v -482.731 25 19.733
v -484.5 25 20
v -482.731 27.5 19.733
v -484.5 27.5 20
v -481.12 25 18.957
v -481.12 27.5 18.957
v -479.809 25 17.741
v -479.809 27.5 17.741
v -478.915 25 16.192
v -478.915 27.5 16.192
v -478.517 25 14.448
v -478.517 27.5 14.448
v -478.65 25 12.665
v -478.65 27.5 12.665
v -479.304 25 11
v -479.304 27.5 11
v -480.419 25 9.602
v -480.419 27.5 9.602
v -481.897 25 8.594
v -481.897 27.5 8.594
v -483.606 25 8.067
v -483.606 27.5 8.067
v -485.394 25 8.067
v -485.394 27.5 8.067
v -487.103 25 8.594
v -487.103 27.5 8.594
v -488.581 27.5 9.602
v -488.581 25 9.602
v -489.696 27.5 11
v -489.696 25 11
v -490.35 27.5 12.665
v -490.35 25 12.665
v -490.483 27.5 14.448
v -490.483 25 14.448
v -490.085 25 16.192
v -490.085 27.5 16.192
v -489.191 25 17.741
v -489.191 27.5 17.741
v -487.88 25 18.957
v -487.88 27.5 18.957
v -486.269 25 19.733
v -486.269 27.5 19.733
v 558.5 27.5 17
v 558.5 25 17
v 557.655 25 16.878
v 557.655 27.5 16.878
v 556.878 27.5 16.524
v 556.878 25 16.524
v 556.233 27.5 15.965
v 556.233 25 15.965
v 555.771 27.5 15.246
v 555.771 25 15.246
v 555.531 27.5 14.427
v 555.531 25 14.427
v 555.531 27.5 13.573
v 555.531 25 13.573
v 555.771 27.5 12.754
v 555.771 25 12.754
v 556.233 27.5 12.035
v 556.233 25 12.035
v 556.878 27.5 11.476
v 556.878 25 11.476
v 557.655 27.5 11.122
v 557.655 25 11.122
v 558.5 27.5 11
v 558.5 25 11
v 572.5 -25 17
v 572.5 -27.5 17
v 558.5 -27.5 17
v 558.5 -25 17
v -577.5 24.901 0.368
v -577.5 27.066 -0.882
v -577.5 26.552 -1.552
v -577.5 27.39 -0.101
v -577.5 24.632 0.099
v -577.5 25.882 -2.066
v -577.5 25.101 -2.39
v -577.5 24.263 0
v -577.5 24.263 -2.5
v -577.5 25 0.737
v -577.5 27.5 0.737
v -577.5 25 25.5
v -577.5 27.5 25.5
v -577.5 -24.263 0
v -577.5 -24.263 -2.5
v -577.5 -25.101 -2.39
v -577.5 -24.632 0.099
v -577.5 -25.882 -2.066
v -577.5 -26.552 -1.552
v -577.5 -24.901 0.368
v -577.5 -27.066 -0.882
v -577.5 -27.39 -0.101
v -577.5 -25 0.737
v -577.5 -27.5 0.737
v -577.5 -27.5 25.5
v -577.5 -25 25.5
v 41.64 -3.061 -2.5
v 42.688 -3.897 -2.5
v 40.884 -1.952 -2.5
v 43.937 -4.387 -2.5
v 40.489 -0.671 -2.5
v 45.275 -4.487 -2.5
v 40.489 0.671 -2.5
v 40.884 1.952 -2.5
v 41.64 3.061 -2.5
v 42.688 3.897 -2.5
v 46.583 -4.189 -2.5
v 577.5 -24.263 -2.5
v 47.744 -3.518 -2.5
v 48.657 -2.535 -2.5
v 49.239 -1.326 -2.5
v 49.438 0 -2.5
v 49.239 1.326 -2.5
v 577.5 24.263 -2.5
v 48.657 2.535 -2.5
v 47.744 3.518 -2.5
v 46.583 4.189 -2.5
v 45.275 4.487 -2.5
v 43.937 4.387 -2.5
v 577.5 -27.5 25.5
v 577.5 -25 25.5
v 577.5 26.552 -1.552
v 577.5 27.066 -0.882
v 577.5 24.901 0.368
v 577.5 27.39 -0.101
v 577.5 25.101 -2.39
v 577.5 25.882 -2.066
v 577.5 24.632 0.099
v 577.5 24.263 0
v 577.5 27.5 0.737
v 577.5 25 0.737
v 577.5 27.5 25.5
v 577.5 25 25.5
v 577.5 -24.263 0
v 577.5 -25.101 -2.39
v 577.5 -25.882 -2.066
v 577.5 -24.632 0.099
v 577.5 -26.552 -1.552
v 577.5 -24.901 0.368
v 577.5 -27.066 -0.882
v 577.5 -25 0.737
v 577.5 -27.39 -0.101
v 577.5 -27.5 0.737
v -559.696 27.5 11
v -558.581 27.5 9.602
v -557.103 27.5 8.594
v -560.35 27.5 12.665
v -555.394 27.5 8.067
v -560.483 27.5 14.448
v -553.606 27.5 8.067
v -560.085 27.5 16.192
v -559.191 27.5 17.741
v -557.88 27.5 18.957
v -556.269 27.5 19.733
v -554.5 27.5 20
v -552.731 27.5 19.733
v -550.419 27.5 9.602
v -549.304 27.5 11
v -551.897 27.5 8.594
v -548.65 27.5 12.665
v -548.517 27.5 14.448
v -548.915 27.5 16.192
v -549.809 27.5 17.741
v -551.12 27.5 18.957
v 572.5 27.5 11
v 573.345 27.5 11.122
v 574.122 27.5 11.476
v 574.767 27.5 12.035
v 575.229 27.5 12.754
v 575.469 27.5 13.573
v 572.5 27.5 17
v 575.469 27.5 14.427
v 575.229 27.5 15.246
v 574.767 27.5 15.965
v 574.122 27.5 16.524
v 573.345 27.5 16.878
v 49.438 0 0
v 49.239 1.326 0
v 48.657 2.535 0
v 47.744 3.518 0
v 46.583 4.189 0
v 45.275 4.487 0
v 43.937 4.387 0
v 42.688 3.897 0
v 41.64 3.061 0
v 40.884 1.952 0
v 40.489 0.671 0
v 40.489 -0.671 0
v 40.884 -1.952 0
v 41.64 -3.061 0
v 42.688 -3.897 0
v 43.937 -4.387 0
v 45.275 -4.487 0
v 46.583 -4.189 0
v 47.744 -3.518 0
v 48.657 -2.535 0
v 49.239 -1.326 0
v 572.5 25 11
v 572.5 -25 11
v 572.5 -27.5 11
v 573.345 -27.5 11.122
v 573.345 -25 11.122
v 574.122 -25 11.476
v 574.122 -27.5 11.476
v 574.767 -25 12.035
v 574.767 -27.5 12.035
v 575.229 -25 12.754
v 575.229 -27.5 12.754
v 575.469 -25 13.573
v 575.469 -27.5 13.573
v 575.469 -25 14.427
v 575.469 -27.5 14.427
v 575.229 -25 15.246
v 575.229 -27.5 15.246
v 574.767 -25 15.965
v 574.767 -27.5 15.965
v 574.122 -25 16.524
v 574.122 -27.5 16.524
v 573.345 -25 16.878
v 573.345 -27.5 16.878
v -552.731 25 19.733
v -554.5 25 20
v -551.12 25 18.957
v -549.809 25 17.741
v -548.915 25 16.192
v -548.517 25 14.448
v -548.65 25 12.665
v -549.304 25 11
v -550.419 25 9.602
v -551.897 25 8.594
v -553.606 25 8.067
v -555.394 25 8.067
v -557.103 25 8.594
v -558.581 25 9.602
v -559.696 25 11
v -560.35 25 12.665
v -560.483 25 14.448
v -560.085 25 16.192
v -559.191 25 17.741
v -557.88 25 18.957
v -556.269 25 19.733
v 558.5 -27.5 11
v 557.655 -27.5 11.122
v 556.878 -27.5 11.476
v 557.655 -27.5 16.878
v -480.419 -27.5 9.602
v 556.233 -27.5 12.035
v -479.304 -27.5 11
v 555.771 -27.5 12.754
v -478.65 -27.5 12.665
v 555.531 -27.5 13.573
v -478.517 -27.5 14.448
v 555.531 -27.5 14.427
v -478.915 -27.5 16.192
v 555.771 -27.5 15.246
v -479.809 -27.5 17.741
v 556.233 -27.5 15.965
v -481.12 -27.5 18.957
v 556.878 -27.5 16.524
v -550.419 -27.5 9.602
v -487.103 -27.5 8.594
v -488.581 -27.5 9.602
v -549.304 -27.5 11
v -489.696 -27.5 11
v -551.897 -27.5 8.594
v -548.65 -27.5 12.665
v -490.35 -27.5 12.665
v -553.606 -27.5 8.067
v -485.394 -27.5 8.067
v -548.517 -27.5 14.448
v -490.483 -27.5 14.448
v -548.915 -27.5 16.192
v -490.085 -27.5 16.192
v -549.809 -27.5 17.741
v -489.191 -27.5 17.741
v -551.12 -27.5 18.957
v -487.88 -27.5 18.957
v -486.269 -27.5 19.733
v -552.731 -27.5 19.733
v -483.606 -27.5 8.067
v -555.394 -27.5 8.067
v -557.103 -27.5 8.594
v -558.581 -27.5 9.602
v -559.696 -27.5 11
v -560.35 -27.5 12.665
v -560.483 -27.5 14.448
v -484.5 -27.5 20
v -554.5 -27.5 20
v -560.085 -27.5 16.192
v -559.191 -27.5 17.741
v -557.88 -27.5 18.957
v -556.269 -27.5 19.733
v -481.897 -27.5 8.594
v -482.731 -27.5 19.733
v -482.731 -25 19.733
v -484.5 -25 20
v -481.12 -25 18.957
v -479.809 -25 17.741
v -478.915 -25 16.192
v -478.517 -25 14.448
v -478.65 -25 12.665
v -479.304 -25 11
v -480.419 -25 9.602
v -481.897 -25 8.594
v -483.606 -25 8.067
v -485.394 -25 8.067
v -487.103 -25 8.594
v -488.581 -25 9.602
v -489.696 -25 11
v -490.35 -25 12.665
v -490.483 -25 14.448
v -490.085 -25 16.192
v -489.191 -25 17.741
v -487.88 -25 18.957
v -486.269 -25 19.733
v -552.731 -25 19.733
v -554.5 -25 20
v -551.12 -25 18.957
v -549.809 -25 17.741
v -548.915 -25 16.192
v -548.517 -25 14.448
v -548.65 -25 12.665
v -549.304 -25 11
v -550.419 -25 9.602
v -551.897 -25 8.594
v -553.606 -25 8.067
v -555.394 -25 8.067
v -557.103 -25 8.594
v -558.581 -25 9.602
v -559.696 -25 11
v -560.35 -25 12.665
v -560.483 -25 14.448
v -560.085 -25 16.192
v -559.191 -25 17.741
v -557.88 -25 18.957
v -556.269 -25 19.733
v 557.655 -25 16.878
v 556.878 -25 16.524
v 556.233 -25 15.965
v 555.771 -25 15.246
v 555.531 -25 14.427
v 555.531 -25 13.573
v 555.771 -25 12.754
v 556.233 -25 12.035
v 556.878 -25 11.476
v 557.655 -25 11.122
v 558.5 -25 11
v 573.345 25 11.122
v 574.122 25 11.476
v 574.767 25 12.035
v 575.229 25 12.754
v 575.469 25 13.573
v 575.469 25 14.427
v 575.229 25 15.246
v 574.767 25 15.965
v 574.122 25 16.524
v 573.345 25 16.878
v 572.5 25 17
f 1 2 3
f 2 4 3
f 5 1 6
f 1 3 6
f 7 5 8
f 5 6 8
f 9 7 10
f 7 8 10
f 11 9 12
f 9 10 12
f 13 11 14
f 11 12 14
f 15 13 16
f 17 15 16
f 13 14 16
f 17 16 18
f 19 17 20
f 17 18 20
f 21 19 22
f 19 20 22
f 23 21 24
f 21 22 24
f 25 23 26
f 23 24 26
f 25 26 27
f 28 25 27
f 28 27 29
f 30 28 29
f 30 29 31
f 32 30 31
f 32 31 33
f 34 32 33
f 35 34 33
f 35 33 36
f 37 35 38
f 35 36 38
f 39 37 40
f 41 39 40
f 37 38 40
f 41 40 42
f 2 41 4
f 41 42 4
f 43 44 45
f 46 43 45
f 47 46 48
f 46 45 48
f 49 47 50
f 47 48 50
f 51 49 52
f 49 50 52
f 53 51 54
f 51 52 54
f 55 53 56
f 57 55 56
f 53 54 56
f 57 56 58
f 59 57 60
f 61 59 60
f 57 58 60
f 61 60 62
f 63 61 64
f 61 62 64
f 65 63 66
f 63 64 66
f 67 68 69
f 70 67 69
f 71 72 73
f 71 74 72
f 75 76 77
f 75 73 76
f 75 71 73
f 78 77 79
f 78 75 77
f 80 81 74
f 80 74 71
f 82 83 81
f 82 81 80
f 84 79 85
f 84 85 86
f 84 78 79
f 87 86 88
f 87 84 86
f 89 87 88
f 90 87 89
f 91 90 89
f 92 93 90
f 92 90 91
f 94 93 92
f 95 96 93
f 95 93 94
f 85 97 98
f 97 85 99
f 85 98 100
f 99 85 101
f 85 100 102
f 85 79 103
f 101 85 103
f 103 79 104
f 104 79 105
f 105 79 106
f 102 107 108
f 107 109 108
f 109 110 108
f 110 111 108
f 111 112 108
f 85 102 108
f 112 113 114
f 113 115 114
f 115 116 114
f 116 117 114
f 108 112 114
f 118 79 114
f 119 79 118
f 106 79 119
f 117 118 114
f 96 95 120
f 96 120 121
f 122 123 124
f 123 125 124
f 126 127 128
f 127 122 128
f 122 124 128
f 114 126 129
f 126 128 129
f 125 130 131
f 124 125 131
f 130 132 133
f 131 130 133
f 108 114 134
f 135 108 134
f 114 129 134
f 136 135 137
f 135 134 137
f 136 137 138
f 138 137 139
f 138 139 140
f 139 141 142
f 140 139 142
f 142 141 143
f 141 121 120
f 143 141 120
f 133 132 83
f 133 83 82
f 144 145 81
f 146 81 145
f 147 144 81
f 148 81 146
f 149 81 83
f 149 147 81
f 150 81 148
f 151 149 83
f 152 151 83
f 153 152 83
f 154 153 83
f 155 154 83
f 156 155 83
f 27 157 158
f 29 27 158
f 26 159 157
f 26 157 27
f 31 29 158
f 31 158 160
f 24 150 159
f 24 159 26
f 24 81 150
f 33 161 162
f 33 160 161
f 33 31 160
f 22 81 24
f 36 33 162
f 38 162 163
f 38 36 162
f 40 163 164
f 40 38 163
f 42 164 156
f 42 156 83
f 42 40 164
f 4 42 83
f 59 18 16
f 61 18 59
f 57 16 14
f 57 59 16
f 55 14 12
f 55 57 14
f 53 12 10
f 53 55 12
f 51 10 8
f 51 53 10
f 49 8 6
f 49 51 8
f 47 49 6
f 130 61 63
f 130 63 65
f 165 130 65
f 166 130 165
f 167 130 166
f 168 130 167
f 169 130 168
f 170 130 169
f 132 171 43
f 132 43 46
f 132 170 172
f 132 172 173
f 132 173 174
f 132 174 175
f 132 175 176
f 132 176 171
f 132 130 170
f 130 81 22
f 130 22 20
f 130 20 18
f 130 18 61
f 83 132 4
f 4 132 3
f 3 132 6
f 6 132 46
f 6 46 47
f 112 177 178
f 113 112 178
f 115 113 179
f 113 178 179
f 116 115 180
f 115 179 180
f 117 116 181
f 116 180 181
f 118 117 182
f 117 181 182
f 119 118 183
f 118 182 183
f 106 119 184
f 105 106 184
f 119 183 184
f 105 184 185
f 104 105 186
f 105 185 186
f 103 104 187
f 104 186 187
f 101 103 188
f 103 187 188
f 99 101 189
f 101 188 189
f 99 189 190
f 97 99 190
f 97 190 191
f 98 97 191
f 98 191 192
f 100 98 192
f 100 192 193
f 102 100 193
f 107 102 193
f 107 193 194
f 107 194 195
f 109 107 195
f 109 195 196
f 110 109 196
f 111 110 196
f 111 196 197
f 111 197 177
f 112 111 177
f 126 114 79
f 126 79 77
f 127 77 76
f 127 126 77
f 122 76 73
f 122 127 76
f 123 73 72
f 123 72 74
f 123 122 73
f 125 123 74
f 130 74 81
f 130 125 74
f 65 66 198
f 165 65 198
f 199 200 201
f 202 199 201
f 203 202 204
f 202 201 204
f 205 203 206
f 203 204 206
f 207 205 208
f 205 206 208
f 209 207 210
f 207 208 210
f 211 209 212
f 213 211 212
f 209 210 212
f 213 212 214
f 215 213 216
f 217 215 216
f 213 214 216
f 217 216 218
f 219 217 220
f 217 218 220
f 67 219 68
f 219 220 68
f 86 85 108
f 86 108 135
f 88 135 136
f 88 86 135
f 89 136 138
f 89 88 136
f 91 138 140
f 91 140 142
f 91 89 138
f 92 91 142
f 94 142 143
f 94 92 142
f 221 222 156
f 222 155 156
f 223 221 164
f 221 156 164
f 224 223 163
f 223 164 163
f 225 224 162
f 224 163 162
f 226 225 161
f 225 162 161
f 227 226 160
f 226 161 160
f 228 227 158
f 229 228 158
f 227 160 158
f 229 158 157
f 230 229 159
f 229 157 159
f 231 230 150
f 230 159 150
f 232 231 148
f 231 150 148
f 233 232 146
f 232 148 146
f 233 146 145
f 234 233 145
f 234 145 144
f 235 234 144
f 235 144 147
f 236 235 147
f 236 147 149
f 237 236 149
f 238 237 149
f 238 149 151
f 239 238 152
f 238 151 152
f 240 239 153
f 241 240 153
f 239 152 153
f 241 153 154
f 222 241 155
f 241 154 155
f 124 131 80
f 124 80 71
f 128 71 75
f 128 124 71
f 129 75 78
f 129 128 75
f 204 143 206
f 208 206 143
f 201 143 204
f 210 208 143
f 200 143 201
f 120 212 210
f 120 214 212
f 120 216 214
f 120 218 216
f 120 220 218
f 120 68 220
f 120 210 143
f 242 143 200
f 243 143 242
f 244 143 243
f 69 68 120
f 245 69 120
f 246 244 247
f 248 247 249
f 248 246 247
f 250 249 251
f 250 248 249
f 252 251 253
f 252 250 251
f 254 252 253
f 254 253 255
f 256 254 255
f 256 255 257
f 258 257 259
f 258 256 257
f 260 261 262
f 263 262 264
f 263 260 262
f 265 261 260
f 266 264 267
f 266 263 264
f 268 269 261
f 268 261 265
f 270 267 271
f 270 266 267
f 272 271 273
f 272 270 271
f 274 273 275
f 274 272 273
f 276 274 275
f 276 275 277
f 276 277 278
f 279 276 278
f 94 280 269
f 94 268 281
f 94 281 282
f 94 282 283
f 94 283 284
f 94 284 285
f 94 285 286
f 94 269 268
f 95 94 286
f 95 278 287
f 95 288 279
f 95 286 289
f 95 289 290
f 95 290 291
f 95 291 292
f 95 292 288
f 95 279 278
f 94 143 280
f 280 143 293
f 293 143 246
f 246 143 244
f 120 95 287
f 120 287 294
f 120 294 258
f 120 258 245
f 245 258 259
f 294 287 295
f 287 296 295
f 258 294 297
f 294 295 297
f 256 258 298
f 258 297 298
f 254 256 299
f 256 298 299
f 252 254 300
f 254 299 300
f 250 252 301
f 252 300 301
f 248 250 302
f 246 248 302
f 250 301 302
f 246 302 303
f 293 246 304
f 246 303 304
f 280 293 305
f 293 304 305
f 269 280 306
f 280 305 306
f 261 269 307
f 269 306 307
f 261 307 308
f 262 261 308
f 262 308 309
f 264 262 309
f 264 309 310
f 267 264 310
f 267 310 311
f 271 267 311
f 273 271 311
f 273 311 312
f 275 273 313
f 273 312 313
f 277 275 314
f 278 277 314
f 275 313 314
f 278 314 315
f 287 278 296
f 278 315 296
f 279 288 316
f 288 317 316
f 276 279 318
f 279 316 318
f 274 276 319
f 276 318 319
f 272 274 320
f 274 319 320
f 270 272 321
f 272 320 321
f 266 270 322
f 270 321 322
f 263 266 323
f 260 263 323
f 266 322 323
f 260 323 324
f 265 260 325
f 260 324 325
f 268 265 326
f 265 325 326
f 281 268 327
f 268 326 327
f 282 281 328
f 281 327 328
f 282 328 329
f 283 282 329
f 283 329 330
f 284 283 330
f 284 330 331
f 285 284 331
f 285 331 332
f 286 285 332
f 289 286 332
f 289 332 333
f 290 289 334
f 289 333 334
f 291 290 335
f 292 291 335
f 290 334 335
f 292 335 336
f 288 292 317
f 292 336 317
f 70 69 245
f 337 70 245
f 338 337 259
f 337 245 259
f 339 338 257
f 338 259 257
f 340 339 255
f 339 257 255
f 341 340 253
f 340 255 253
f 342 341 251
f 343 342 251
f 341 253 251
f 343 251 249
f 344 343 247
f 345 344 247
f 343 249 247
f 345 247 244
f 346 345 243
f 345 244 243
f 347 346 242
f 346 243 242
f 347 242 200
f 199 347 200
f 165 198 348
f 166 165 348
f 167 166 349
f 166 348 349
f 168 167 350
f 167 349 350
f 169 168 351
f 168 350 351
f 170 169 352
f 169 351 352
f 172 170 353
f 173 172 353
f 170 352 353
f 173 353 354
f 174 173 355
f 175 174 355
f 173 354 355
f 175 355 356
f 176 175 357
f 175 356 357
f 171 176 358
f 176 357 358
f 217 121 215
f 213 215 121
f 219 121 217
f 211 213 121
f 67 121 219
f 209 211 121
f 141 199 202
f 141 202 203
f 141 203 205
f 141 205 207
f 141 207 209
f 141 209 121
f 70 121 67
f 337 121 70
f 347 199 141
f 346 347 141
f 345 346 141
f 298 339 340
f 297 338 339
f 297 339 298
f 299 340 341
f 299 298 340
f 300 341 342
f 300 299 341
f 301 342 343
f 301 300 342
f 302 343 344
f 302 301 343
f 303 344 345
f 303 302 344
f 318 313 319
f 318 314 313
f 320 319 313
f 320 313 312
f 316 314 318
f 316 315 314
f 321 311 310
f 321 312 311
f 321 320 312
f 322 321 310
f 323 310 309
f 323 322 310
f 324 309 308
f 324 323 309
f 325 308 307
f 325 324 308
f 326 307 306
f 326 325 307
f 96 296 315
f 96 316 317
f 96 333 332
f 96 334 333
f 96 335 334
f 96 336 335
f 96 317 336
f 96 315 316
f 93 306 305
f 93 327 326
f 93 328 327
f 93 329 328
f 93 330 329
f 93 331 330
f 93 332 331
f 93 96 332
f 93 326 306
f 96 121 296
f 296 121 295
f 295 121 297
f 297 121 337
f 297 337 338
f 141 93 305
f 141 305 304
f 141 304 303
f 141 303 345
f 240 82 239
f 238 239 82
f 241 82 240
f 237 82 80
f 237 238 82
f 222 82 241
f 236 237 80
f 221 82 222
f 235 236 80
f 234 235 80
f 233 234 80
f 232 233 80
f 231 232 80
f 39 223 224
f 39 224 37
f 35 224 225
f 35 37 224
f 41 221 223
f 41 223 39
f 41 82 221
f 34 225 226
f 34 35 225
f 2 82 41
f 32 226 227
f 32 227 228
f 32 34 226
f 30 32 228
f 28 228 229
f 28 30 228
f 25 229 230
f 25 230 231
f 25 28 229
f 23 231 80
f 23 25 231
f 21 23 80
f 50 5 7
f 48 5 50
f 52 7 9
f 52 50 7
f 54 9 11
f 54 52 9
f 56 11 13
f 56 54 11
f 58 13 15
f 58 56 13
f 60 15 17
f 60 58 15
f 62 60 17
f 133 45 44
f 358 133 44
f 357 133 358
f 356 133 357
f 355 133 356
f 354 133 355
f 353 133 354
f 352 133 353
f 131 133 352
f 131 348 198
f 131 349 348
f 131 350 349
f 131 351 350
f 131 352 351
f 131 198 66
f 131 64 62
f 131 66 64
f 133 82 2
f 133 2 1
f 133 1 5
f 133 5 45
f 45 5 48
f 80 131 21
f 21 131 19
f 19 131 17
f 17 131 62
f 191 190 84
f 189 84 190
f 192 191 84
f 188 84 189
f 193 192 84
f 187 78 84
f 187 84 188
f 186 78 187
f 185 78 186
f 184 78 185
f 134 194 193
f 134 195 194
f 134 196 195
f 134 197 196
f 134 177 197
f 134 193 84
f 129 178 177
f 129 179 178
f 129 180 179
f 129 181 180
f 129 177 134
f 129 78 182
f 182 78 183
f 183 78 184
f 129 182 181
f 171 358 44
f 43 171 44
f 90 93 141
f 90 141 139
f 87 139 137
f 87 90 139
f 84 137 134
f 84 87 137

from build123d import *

# Parameters (mm, degrees)
SKETCH1_W                      = 1155
SKETCH1_H                      = 55
BASE_FLANGE1_DEPTH             = 2.5
EDGE_FLANGE1_STRIP_W           = 11.4732
EDGE_FLANGE1_STRIP_H           = 2.5
EDGE_FLANGE1_STRIP_CUT_DEPTH   = 1155
EDGE_FLANGE1_STRIP_2_W         = 11.4732
EDGE_FLANGE1_STRIP_2_H         = 2.5
EDGE_FLANGE1_STRIP_CUT_2_DEPTH = 1155
EDGE_FLANGE1_DEPTH             = 1155
EDGE_FLANGE1_BEND_DEPTH        = 1155
CUT_EXTRUDE1_DEPTH             = 581.673316074
CUT_EXTRUDE1_DEPTH_BACK        = 581.673316074
SKETCH13_R                     = 6
CUT_EXTRUDE2_DEPTH             = 581.673316074
LPATTERN1_COUNT                = 2
LPATTERN1_PITCH                = 70
SKETCH14_R                     = 4.5
CUT_EXTRUDE3_DEPTH             = 10


# Sheet-metal steps are written as plain solids
with BuildPart() as part:
    # Sketch1 → Base-Flange1 (new body)
    with BuildSketch(Plane.XY):
        Rectangle(SKETCH1_W, SKETCH1_H)
    extrude(amount=-BASE_FLANGE1_DEPTH)

    # Edge-Flange1 strip (across the edge) → Edge-Flange1 strip cut (cut)
    with BuildSketch(Plane(origin=(577.5, 27.5, 0), x_dir=(0, -1, 0), z_dir=(-1, 0, 0))):
        with Locations((-2.5, -1.25)):
            Rectangle(EDGE_FLANGE1_STRIP_W, EDGE_FLANGE1_STRIP_H)
    extrude(amount=EDGE_FLANGE1_STRIP_CUT_DEPTH, mode=Mode.SUBTRACT)

    # Edge-Flange1 strip 2 (across the edge) → Edge-Flange1 strip cut 2 (cut)
    with BuildSketch(Plane(origin=(-577.5, -27.5, 0), x_dir=(0, 1, 0), z_dir=(1, 0, 0))):
        with Locations((-2.5, -1.25)):
            Rectangle(EDGE_FLANGE1_STRIP_2_W, EDGE_FLANGE1_STRIP_2_H)
    extrude(amount=EDGE_FLANGE1_STRIP_CUT_2_DEPTH, mode=Mode.SUBTRACT)

    # Edge-Flange1 section (across the edge) → Edge-Flange1 (add)
    with BuildSketch(Plane(origin=(577.5, 27.5, 0), x_dir=(0, -1, 0), z_dir=(-1, 0, 0))):
        with BuildLine():
            Line((0, 0.7366), (0, 25.5))
            Line((0, 25.5), (2.5, 25.5))
            Line((2.5, 25.5), (2.5, 0.7366))
            ThreePointArc((2.5, 0.7366), (2.715745145, 0.215745145), (3.2366, 0))
            Line((3.2366, 0), (3.2366, -2.5))
            ThreePointArc((3.2366, -2.5), (0.947978192, -1.552021808), (0, 0.7366))
        make_face()
    extrude(amount=EDGE_FLANGE1_DEPTH)

    # Edge-Flange1 section 2 (across the edge) → Edge-Flange1 bend (add)
    with BuildSketch(Plane(origin=(-577.5, -27.5, 0), x_dir=(0, 1, 0), z_dir=(1, 0, 0))):
        with BuildLine():
            Line((0, 0.7366), (0, 25.5))
            Line((0, 25.5), (2.5, 25.5))
            Line((2.5, 25.5), (2.5, 0.7366))
            ThreePointArc((2.5, 0.7366), (2.715745145, 0.215745145), (3.2366, 0))
            Line((3.2366, 0), (3.2366, -2.5))
            ThreePointArc((3.2366, -2.5), (0.947978192, -1.552021808), (0, 0.7366))
        make_face()
    extrude(amount=EDGE_FLANGE1_BEND_DEPTH)

    # Sketch12 → Cut-Extrude1 (cut, two sides: drawn at the far end of the back side and taken through both)
    with BuildSketch(Plane(origin=(0, 27.5, 0), x_dir=(1, 0, 0), z_dir=(0, 1, 0)).offset(-CUT_EXTRUDE1_DEPTH_BACK)):
        with BuildLine():
            Line((572.5, -17), (558.5, -17))
            ThreePointArc((558.5, -17), (555.5, -14), (558.5, -11))
            Line((558.5, -11), (572.5, -11))
            ThreePointArc((572.5, -11), (575.5, -14), (572.5, -17))
        make_face()
    extrude(amount=CUT_EXTRUDE1_DEPTH + CUT_EXTRUDE1_DEPTH_BACK, mode=Mode.SUBTRACT)

    # Sketch13 → Cut-Extrude2 (cut, symmetric)
    with BuildSketch(Plane(origin=(0, 27.5, 0), x_dir=(1, 0, 0), z_dir=(0, 1, 0))):
        with Locations(Location((-554.5, -14, 0), (0, 0, 270))):
            Circle(SKETCH13_R)
    cut_extrude2 = extrude(amount=CUT_EXTRUDE2_DEPTH, both=True, mode=Mode.SUBTRACT)

    # LPattern1: Cut-Extrude2 ×2
    with Locations(*[(i * LPATTERN1_PITCH, 0, 0) for i in range(1, LPATTERN1_COUNT)]):
        add(cut_extrude2, mode=Mode.SUBTRACT)

    # Sketch14 → Cut-Extrude3 (cut)
    with BuildSketch(Plane.XY):
        with Locations((44.9385, 0)):
            Circle(SKETCH14_R)
    extrude(amount=-CUT_EXTRUDE3_DEPTH, mode=Mode.SUBTRACT)


solid = part.part
